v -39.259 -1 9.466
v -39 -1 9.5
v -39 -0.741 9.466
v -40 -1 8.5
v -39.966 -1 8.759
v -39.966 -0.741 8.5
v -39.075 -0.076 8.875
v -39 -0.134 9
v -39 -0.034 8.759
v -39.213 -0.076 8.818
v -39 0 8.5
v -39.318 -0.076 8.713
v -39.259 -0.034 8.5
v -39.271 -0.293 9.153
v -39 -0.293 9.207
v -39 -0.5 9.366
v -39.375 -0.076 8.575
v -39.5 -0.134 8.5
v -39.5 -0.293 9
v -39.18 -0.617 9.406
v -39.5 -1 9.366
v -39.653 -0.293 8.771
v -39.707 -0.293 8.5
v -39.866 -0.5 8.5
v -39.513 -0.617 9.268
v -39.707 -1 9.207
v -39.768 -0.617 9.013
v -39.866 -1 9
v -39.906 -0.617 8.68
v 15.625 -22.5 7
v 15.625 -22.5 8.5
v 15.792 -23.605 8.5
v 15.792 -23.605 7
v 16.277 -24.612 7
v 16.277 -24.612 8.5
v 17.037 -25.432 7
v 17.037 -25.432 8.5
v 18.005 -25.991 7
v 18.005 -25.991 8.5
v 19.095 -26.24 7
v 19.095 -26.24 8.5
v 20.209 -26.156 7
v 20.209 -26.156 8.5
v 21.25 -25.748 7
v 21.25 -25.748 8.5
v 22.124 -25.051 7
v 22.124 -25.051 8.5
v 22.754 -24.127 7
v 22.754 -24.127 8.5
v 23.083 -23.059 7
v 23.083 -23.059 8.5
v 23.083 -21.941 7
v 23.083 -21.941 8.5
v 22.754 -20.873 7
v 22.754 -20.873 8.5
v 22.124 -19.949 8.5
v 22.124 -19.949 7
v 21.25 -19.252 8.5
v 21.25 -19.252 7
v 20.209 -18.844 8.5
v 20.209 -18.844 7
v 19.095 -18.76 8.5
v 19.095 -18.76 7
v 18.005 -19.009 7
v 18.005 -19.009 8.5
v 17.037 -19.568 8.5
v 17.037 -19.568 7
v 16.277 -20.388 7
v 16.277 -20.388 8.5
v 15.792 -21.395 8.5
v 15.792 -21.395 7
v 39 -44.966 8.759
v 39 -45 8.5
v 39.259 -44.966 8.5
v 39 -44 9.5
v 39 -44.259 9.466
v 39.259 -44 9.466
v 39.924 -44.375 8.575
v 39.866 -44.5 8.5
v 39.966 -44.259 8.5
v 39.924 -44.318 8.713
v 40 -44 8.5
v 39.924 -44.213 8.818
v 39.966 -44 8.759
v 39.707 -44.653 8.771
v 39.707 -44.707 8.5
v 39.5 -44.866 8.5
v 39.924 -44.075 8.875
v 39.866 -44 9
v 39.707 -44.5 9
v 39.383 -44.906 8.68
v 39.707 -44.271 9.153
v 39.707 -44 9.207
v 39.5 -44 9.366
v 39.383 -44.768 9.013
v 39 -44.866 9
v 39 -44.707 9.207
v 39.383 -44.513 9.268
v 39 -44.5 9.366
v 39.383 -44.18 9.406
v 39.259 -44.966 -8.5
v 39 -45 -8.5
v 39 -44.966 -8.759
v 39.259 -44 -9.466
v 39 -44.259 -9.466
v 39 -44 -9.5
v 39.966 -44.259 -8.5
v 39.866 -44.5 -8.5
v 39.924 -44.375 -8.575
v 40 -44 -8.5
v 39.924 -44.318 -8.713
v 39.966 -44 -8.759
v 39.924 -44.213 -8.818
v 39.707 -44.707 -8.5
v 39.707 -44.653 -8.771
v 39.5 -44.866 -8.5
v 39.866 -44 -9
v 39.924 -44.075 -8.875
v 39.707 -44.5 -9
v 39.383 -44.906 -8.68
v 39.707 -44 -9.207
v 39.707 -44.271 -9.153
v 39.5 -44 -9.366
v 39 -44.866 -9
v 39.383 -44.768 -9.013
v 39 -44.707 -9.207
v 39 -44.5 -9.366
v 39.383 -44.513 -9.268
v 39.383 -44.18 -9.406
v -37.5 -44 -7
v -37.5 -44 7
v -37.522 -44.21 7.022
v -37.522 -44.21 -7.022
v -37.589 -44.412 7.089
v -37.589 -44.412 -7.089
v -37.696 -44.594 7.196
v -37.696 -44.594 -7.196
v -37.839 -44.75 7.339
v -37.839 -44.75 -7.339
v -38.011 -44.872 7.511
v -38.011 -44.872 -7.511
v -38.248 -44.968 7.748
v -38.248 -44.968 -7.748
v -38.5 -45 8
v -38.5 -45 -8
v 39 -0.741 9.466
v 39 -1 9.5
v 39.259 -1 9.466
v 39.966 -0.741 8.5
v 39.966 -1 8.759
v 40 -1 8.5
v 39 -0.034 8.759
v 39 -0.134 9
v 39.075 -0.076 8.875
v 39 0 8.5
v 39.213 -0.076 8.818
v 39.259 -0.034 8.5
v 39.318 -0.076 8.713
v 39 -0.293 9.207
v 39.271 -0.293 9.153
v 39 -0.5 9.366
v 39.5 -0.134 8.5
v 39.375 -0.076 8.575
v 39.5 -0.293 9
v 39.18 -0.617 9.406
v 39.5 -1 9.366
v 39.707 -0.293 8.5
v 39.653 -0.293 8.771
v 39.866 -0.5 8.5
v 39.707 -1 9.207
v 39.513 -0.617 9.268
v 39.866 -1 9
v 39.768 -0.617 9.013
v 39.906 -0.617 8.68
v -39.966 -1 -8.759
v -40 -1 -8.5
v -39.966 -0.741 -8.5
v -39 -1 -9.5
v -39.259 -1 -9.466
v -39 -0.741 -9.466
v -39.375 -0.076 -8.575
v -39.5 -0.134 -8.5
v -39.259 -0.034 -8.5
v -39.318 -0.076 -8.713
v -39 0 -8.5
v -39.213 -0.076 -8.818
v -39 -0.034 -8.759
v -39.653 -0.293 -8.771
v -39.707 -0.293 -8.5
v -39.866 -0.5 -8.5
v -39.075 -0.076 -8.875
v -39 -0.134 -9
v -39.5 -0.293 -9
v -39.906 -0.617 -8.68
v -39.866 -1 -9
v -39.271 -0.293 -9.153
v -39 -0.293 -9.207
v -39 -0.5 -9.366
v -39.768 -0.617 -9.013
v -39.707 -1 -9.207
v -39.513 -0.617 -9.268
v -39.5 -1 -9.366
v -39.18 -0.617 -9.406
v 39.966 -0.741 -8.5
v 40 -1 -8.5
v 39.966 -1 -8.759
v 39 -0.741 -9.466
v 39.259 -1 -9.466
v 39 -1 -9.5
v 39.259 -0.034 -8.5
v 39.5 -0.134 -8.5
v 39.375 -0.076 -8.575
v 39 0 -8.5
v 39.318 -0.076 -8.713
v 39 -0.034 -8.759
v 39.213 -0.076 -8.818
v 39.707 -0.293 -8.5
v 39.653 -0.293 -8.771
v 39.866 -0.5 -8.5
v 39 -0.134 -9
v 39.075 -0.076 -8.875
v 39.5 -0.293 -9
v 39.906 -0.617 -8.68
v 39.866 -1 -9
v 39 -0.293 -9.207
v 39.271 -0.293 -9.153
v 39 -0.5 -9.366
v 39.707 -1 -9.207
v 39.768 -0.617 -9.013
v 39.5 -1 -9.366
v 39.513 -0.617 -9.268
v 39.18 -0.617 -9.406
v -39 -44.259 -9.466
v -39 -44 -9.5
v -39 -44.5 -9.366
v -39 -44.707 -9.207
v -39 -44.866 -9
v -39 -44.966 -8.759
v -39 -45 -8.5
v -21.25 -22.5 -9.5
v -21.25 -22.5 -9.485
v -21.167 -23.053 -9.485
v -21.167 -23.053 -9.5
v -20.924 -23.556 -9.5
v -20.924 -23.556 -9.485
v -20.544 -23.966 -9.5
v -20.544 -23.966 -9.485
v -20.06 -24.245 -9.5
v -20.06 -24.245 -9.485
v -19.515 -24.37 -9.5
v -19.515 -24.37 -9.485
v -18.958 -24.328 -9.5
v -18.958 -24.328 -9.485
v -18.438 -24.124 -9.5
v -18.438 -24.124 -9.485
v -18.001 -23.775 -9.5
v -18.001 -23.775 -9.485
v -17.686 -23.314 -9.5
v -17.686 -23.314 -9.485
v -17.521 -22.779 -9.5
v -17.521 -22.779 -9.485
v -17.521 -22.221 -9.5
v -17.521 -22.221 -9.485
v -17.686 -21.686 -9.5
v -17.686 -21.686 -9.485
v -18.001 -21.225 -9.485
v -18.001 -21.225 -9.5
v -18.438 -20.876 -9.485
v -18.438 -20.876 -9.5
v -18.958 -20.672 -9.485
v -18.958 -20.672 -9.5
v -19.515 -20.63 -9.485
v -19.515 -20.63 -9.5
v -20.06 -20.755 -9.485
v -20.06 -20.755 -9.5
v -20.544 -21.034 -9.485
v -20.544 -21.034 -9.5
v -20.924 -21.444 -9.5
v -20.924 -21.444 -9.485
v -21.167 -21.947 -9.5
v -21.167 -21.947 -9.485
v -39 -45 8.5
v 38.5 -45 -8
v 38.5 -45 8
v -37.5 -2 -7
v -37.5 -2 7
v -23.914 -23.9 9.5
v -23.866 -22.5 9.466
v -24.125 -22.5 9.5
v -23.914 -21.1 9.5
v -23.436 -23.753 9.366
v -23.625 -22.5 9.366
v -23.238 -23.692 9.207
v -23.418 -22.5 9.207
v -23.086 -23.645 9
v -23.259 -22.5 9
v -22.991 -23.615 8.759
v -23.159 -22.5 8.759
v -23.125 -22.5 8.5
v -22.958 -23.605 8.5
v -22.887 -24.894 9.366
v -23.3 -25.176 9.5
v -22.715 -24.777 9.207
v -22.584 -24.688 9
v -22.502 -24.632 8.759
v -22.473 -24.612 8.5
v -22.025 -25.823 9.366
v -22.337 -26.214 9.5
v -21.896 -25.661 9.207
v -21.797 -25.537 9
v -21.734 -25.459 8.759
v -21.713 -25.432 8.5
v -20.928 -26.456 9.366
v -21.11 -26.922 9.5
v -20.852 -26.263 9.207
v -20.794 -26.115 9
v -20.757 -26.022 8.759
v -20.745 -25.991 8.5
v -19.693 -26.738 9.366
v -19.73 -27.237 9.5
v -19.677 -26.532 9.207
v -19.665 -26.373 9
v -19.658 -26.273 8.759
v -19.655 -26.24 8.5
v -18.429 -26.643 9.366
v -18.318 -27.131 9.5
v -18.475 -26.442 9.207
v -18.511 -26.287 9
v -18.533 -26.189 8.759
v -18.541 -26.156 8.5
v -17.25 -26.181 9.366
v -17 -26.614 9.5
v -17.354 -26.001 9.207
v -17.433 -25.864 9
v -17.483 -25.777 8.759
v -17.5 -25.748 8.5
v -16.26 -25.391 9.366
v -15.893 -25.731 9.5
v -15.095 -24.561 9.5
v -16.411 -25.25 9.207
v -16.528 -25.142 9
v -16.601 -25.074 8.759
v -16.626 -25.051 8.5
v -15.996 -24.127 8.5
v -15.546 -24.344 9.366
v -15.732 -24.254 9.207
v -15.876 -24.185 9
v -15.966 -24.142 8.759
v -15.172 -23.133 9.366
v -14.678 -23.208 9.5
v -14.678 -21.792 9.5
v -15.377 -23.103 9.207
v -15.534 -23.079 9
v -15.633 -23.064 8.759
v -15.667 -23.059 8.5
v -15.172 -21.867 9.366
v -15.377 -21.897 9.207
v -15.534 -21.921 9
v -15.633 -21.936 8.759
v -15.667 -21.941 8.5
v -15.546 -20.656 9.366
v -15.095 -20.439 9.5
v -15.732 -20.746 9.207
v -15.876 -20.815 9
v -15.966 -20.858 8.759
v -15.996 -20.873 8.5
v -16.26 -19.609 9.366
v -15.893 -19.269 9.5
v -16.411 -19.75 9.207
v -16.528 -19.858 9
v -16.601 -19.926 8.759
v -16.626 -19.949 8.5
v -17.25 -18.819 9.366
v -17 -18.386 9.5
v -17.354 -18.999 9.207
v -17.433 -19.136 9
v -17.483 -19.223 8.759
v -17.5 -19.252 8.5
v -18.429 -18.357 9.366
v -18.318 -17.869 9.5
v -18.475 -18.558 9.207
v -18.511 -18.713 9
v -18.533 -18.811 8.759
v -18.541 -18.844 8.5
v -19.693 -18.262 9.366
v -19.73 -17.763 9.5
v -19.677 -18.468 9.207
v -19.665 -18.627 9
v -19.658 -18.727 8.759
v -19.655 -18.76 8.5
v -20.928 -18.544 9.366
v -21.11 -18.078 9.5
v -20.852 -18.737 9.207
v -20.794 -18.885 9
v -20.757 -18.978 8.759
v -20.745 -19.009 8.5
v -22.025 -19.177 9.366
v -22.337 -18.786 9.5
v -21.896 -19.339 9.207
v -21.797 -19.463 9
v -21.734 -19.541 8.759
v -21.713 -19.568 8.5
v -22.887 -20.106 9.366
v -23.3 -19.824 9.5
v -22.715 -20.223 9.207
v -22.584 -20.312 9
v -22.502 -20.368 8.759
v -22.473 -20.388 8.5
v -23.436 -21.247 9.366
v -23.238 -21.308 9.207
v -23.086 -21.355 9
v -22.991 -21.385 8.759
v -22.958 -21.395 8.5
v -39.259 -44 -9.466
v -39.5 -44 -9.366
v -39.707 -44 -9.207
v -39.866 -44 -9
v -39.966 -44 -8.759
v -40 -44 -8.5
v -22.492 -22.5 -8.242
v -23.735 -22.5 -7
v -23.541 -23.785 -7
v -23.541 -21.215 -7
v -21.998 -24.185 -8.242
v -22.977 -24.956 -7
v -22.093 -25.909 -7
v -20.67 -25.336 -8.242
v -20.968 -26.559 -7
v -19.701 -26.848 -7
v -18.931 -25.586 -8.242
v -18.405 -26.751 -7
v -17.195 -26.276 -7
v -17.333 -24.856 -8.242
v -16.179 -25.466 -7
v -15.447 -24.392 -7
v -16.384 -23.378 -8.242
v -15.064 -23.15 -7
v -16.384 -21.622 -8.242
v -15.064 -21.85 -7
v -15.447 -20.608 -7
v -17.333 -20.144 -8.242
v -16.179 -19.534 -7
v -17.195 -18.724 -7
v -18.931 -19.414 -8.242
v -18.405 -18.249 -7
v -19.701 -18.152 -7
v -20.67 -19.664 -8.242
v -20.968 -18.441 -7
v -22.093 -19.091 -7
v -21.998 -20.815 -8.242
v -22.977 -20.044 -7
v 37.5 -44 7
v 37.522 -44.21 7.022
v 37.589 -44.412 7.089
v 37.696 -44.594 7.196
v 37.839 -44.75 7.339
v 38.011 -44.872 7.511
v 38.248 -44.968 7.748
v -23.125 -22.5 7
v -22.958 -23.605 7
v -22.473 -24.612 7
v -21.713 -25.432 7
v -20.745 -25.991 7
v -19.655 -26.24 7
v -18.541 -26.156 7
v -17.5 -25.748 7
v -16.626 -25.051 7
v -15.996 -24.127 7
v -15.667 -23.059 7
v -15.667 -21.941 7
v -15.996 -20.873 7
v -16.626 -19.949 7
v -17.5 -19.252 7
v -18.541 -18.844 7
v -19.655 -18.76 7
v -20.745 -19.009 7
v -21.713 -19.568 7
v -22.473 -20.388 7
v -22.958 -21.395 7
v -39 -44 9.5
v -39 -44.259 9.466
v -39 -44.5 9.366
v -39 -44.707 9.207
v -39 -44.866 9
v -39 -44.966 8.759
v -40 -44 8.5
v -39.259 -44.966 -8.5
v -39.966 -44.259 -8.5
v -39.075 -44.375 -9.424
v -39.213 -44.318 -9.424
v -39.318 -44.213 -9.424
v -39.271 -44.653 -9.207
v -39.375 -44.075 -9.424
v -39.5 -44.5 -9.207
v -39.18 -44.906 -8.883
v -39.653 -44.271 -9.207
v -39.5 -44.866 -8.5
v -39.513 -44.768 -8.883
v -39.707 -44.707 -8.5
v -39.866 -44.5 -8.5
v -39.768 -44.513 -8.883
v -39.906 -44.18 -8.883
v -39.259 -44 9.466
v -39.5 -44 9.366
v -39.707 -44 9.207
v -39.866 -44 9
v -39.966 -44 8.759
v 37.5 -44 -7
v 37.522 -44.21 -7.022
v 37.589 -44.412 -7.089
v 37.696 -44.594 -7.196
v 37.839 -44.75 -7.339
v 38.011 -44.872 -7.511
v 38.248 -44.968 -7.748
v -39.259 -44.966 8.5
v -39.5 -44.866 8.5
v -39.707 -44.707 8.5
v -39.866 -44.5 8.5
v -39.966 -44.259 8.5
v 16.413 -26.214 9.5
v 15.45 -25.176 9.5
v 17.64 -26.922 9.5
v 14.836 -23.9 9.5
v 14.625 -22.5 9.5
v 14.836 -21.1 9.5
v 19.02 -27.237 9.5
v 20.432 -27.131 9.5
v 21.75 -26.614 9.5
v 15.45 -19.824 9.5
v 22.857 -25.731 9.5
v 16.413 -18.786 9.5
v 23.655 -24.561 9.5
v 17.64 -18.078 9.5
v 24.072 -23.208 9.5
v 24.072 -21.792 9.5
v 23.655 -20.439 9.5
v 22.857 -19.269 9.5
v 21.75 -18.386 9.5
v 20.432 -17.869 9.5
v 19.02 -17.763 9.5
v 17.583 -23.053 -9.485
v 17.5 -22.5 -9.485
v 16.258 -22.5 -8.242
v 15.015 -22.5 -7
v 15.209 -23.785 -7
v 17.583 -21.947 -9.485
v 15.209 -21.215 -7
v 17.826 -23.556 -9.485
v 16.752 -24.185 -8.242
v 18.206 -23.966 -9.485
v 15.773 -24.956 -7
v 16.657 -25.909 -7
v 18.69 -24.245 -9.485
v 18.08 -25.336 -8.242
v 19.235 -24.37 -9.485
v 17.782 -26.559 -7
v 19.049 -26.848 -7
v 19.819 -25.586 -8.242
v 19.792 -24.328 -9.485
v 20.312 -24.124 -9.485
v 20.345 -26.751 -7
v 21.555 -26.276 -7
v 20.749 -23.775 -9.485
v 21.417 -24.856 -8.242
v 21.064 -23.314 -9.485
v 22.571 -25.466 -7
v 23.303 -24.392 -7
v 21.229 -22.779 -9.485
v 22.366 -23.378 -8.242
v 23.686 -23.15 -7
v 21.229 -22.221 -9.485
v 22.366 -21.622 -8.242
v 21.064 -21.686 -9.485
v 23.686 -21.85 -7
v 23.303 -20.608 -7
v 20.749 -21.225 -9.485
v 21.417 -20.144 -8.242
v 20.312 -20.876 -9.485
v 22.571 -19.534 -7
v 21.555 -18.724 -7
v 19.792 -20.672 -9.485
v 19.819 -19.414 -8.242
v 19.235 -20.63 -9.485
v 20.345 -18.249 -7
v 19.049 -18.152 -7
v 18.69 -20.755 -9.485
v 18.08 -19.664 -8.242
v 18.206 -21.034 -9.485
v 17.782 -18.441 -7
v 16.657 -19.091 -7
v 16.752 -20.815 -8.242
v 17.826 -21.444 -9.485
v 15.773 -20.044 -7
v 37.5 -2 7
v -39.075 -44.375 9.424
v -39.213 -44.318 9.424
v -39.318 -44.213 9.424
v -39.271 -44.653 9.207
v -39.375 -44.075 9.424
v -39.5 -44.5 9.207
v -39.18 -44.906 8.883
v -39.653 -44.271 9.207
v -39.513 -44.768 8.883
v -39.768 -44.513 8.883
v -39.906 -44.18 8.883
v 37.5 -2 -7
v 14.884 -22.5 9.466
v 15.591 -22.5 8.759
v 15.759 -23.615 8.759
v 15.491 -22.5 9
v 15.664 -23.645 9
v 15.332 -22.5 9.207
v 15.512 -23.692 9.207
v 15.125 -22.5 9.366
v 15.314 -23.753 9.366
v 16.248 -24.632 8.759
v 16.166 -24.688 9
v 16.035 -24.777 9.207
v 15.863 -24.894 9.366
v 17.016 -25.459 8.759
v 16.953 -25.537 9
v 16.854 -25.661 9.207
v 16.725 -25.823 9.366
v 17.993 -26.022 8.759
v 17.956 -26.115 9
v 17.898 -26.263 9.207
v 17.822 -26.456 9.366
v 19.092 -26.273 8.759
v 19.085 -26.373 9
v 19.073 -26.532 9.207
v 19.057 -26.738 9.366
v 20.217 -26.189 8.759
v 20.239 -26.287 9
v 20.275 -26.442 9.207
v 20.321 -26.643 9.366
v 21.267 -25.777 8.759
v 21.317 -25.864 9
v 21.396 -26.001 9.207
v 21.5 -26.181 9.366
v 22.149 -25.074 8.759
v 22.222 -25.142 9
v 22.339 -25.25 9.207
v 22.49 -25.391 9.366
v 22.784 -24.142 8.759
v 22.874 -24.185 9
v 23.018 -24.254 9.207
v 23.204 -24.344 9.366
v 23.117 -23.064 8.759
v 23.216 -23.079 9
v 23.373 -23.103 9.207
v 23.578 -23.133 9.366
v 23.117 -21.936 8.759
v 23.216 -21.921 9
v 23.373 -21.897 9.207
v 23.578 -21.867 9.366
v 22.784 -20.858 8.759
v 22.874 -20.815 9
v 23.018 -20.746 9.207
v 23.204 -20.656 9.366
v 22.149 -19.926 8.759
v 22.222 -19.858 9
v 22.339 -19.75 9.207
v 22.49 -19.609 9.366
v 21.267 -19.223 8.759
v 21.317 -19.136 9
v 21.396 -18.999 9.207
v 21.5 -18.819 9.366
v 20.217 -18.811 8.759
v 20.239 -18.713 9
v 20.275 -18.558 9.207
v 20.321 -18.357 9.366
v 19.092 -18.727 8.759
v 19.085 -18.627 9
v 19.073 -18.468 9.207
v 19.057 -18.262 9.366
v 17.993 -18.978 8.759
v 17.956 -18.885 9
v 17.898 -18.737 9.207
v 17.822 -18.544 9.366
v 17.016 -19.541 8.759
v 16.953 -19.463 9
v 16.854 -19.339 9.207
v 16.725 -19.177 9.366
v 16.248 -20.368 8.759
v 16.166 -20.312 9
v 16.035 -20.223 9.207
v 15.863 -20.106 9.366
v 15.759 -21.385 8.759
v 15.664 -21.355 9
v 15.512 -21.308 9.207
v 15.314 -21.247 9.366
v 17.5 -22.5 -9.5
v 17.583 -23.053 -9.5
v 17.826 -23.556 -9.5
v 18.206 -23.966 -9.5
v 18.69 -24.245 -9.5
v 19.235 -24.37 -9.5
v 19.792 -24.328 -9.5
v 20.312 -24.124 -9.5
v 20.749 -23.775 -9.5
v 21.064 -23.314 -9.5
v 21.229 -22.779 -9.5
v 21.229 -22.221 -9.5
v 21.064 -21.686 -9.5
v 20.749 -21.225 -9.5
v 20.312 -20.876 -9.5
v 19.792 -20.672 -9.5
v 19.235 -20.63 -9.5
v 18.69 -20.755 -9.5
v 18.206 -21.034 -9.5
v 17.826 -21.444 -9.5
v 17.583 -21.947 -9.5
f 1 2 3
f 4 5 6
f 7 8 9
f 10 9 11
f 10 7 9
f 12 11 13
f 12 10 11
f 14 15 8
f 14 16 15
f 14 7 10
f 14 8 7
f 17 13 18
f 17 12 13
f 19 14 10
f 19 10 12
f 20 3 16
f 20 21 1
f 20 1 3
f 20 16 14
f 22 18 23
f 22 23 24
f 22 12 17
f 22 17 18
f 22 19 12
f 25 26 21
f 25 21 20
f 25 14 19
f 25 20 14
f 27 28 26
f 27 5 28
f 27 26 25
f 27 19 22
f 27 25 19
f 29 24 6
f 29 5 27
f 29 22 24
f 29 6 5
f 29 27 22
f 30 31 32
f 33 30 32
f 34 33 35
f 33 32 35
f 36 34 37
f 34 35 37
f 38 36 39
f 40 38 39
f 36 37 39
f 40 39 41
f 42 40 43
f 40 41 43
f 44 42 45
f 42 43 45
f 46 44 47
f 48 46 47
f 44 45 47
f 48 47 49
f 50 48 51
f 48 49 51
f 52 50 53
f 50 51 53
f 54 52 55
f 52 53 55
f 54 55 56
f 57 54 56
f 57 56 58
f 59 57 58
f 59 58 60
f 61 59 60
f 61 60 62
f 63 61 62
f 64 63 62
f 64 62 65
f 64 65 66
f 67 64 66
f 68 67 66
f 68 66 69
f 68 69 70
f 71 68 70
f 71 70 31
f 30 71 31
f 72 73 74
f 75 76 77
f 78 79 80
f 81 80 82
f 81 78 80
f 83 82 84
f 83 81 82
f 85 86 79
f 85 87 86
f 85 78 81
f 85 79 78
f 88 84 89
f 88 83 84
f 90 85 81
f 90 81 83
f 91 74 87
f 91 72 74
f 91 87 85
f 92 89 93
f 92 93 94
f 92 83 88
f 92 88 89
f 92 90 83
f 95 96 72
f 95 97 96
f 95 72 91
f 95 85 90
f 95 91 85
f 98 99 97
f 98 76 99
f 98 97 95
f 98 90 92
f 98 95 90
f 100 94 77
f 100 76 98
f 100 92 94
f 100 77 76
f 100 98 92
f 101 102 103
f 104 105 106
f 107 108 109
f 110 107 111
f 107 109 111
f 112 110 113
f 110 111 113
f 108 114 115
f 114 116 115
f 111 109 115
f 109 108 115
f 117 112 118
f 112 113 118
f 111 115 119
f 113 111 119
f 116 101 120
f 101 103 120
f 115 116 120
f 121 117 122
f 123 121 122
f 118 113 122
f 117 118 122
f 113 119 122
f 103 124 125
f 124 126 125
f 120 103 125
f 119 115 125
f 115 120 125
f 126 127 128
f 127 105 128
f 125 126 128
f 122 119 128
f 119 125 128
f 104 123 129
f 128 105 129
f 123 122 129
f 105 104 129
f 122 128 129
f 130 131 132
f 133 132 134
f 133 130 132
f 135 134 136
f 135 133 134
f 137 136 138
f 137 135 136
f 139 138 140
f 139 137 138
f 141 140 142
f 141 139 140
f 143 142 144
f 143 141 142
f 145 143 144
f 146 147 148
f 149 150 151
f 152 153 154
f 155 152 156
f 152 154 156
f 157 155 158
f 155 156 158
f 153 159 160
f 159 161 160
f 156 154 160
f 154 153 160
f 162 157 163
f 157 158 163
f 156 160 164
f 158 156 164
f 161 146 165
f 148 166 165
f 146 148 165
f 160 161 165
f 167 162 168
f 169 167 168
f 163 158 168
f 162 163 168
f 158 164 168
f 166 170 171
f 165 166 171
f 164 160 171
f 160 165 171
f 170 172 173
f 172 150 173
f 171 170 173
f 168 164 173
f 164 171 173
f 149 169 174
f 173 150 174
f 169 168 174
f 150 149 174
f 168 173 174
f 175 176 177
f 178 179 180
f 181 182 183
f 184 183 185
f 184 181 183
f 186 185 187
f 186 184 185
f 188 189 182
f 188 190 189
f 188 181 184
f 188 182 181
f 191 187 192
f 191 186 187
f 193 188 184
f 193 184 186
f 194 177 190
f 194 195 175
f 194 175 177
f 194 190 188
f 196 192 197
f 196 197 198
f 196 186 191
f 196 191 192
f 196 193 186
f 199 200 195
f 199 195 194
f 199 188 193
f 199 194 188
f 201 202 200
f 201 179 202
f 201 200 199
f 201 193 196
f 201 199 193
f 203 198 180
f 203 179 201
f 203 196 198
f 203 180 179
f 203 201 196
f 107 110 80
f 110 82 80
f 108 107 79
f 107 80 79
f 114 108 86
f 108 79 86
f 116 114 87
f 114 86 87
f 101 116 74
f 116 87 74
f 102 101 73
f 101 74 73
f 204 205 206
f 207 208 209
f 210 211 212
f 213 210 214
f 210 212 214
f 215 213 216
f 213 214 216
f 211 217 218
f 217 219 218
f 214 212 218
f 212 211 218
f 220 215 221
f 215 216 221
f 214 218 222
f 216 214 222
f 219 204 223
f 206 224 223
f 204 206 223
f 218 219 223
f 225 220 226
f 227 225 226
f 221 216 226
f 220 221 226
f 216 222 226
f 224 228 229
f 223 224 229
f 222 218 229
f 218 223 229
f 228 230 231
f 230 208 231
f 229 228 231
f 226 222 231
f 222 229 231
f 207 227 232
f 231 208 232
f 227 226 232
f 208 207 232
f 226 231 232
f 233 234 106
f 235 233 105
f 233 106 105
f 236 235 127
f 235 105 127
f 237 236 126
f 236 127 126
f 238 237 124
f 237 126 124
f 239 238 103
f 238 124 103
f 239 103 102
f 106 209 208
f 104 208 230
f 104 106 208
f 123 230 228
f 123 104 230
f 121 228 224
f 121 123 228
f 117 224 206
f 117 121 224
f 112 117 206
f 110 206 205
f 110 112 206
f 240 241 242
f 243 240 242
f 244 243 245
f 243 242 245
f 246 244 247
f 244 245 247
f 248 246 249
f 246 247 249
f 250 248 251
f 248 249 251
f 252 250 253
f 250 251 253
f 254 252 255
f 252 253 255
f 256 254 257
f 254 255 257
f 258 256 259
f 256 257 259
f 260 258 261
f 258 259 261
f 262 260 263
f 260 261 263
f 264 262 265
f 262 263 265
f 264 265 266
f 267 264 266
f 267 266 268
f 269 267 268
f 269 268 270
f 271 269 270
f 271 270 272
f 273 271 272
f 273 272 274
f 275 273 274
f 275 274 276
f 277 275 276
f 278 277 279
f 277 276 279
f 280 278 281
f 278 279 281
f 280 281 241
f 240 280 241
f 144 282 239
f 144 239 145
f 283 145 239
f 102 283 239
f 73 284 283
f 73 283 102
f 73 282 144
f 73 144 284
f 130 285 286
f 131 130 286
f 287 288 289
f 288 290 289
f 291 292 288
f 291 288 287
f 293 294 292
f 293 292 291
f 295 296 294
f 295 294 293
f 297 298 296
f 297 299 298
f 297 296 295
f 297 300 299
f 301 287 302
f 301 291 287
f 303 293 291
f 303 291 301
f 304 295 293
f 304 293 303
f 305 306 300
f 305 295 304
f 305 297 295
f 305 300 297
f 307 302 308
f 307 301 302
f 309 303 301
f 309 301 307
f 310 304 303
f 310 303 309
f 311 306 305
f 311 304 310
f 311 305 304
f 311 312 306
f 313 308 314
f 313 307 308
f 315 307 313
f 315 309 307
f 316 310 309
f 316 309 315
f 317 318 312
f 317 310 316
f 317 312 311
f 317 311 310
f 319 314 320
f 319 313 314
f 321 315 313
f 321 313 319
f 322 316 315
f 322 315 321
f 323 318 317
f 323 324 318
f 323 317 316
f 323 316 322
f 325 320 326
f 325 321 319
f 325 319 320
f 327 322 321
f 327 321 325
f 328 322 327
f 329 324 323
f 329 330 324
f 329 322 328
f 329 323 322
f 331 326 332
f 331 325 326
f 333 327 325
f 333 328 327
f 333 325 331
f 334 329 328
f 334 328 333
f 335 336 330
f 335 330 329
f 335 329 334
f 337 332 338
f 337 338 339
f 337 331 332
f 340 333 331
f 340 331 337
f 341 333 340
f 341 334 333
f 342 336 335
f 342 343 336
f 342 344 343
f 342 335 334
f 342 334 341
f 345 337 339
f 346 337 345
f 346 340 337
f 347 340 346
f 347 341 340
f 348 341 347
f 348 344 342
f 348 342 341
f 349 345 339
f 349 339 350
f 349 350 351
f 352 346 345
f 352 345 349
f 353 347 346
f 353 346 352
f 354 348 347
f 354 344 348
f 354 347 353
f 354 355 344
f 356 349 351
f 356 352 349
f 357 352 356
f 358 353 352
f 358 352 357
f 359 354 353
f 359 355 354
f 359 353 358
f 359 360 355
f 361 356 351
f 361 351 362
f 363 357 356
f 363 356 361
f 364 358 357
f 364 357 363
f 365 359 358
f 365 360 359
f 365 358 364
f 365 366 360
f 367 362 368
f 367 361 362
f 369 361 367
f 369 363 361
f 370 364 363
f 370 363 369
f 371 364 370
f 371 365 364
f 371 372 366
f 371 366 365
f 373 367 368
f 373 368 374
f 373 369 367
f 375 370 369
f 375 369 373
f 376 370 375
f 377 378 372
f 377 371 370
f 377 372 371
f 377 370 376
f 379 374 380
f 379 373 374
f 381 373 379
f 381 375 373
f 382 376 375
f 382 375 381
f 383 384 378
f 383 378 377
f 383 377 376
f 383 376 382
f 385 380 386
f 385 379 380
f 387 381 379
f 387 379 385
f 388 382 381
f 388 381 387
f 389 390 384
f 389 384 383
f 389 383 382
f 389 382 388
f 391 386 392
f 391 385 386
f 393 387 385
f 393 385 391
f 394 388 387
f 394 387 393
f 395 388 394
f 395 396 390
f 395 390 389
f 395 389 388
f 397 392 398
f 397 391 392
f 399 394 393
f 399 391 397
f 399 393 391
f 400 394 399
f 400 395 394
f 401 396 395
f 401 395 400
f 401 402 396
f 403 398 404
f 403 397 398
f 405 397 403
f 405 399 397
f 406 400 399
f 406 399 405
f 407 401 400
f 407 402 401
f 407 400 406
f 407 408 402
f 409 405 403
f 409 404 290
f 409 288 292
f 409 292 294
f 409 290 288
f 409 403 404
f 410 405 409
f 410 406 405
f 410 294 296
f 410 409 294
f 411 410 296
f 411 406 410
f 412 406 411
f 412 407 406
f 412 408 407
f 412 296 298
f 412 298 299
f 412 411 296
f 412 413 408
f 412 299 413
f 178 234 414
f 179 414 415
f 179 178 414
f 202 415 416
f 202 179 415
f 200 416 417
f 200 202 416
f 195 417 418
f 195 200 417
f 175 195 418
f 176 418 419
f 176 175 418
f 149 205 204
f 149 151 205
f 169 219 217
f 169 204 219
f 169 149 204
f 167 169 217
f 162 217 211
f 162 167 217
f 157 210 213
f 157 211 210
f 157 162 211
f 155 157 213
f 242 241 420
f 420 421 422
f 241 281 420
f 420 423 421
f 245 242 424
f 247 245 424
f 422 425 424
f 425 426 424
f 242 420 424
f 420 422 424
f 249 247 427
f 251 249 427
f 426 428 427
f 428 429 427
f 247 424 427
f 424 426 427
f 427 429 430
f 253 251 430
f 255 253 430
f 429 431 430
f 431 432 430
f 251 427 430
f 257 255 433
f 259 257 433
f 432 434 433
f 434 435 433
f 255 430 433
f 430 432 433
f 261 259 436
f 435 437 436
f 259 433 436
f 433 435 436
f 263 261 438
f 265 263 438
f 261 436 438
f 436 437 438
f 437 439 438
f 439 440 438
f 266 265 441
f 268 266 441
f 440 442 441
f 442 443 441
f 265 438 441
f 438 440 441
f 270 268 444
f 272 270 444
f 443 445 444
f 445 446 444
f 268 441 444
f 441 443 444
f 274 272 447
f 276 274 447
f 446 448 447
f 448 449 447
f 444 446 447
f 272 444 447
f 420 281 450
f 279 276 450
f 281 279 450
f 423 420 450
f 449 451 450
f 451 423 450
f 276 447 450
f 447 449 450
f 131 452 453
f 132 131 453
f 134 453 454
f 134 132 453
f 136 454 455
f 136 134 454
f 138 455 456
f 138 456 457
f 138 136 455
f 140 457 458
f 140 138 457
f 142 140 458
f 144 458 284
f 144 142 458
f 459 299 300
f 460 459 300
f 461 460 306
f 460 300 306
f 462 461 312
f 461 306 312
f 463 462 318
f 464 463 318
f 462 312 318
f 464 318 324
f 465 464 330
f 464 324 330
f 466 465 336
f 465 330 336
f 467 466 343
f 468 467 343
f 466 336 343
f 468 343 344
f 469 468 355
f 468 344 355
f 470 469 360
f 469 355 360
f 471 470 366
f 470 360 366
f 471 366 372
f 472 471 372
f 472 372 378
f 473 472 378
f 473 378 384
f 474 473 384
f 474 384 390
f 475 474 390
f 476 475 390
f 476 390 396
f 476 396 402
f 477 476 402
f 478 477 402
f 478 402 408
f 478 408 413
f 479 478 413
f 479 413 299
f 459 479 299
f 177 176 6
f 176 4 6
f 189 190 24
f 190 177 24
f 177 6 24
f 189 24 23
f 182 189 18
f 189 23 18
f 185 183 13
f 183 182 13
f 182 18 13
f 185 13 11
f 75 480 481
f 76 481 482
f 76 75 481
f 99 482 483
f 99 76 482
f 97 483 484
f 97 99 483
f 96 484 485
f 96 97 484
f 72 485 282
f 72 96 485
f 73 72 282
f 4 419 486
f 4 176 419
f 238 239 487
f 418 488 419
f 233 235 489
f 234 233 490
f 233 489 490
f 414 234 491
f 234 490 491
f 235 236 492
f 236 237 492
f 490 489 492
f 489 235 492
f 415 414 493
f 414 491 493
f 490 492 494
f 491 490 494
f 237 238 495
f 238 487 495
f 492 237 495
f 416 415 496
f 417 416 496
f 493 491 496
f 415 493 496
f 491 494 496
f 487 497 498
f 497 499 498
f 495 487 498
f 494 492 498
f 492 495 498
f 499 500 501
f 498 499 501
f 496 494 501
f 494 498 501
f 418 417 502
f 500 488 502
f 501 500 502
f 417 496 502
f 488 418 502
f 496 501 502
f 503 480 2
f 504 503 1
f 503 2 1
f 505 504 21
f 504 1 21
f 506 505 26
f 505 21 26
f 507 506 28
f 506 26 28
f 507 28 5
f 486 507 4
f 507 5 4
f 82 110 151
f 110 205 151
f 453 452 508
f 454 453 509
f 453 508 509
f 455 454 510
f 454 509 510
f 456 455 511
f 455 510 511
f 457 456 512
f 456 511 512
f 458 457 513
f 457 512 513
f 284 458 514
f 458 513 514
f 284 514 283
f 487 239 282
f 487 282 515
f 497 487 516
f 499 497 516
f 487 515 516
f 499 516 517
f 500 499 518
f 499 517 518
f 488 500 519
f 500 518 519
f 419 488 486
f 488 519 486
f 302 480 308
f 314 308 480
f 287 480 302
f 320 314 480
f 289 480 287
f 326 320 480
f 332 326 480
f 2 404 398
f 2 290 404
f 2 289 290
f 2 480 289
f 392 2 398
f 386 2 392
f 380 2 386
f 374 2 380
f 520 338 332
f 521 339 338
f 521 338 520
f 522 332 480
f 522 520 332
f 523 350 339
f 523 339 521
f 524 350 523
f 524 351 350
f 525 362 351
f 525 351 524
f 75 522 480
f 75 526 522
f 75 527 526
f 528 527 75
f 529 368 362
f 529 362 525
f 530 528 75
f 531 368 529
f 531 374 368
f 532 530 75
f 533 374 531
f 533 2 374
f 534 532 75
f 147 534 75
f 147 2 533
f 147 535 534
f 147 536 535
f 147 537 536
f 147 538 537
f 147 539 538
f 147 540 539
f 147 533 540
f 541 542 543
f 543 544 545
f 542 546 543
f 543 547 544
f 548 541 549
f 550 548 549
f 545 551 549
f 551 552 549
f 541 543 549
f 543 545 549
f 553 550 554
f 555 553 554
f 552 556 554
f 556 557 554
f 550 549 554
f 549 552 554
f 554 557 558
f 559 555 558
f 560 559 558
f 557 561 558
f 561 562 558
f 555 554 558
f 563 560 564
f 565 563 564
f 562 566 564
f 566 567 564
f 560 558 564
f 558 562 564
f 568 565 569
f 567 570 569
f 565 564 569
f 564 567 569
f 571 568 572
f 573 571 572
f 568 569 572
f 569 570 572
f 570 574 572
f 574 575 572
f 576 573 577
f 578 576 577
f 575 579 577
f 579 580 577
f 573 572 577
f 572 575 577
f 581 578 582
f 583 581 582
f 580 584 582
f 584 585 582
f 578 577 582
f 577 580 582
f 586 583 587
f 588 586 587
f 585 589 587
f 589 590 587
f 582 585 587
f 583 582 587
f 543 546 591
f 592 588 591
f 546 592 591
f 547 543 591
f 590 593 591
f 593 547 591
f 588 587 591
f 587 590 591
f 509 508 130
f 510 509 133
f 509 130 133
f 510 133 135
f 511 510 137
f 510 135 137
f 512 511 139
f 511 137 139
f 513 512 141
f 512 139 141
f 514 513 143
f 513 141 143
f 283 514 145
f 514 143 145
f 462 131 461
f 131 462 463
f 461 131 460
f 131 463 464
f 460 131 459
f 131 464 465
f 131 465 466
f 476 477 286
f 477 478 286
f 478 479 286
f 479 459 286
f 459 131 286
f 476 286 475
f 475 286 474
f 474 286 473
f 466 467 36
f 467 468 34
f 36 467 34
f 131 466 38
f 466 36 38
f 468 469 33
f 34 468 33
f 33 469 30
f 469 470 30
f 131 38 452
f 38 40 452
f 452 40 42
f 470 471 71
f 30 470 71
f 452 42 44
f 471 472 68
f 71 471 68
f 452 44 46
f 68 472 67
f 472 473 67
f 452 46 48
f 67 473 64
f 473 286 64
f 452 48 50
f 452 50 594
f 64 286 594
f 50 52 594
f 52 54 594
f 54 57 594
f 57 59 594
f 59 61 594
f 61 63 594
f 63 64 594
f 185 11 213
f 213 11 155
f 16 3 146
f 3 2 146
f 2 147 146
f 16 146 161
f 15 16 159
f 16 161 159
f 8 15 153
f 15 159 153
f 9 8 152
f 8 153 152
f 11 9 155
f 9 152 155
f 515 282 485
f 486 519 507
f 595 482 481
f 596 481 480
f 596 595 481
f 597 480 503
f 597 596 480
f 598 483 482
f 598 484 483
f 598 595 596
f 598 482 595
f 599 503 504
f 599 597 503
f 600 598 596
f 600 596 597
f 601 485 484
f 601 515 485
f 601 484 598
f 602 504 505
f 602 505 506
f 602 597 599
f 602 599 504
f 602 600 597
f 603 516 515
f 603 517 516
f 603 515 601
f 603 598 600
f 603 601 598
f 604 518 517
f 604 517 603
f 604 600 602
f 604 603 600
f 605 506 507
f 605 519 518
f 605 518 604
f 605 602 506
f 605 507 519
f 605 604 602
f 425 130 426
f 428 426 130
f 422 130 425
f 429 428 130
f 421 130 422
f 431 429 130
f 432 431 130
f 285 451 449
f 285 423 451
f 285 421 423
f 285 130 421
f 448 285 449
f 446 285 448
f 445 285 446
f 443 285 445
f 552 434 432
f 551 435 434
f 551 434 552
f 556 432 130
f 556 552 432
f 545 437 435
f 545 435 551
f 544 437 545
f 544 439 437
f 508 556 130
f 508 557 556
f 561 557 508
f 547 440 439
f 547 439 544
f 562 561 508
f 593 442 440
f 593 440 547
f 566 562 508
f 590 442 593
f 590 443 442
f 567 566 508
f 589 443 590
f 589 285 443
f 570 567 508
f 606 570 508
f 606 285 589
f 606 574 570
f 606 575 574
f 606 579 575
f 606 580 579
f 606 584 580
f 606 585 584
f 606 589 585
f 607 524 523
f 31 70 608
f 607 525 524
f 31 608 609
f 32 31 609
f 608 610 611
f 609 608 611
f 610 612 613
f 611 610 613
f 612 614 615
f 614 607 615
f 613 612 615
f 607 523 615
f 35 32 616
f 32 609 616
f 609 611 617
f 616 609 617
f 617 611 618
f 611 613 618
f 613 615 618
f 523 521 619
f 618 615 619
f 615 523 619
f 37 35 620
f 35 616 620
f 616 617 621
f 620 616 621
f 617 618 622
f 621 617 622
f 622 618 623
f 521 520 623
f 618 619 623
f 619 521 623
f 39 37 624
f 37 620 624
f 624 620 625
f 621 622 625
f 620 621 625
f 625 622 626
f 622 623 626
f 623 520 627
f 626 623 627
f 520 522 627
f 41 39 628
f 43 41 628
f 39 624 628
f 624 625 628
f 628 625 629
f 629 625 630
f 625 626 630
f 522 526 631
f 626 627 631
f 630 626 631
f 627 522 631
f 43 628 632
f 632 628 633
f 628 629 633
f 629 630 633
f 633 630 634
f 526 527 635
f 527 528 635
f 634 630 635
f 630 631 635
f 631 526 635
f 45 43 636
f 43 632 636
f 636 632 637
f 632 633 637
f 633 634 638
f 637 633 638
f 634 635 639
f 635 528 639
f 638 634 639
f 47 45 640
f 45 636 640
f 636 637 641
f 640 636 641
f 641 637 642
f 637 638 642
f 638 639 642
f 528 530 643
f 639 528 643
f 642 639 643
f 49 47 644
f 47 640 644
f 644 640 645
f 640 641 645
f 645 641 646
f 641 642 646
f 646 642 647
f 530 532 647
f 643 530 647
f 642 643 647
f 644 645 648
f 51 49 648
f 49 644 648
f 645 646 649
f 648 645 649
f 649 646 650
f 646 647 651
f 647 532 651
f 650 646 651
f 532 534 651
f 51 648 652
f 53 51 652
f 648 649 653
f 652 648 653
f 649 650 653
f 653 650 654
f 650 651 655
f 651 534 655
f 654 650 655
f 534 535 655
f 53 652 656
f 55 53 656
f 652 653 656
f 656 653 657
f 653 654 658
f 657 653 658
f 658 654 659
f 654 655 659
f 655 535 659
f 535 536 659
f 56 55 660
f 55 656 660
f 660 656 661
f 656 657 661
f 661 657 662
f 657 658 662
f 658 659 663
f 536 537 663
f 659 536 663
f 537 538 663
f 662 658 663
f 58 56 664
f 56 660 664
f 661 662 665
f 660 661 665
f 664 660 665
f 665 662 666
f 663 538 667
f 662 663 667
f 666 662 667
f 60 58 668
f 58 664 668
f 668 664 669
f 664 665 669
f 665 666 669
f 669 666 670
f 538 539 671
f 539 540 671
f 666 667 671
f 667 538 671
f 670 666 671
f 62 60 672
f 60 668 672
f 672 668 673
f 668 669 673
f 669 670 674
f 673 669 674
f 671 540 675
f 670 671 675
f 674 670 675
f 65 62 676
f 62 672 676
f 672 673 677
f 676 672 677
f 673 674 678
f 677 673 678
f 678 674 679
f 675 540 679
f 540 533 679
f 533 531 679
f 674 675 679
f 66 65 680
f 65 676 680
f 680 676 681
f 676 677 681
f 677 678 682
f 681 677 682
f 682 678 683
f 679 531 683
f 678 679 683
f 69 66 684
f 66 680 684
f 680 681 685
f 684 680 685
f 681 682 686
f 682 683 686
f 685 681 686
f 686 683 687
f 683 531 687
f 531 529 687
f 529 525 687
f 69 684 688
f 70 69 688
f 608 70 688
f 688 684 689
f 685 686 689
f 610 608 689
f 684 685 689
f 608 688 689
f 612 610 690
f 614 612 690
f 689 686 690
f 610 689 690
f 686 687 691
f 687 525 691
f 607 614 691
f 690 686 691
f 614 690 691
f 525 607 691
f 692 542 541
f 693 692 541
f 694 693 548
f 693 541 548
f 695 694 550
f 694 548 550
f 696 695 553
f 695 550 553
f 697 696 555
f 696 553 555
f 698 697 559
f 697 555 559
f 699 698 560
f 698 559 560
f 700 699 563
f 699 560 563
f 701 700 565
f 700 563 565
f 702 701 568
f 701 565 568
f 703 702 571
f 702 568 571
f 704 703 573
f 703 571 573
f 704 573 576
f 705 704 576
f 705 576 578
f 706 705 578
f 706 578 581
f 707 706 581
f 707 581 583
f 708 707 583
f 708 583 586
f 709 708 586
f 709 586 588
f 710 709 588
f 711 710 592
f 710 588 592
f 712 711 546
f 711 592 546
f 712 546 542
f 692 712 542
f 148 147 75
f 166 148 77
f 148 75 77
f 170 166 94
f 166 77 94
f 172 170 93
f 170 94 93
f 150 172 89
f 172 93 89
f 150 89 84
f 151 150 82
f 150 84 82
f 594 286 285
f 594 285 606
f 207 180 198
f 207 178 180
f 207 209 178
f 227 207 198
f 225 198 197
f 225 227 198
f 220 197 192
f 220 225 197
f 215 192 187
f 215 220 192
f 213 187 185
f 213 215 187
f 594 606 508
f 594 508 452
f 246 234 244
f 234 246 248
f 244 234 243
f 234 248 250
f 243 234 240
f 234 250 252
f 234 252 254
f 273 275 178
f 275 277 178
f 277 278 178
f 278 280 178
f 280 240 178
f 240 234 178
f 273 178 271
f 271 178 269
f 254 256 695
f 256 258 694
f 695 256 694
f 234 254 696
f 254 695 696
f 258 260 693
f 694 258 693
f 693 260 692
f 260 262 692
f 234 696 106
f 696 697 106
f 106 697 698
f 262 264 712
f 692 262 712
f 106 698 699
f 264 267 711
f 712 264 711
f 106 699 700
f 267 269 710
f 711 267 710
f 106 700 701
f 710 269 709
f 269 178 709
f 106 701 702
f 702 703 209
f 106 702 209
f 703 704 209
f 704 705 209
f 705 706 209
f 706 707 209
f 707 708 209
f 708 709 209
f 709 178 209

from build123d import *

# Parameters (mm, degrees)
SKETCH_W          = 80
SKETCH_H          = 19
PAD_DEPTH         = 45
SKETCH001_W       = 75
SKETCH001_H       = 14
POCKET_DEPTH      = 0.001
POCKET_DEPTH_BACK = 45.001
SKETCH002_R       = 3.75
POCKET001_DEPTH   = 3.5
SKETCH003_R       = 1.875
POCKET002_DEPTH   = 2.5
CHAMFER_SIZE      = 2.485
SKETCH004_W       = 80
SKETCH004_H       = 19
PAD001_DEPTH      = 2
FILLET_R          = 1


with BuildPart() as part:
    # Sketch → Pad (new body)
    with BuildSketch(Plane.XZ):
        Rectangle(SKETCH_W, SKETCH_H)
    extrude(amount=PAD_DEPTH)

    # Sketch001 → Pocket (cut, two sides)
    with BuildSketch(Plane.XZ) as pocket_sk:
        Rectangle(SKETCH001_W, SKETCH001_H)
    extrude(amount=-POCKET_DEPTH, mode=Mode.SUBTRACT)
    extrude(pocket_sk.sketch, amount=POCKET_DEPTH_BACK, mode=Mode.SUBTRACT)

    # Sketch002 (on DatumPlane) → Pocket001 (cut)
    with BuildSketch(Plane(origin=(0, 0, 9.5), x_dir=(-1, 0, 0), z_dir=(0, 0, 1))):
        with Locations((-19.375, 22.5)):
            Circle(SKETCH002_R)
        with Locations((19.375, 22.5)):
            Circle(SKETCH002_R)
    extrude(amount=-POCKET001_DEPTH, mode=Mode.SUBTRACT)

    # Sketch003 (on DatumPlane) → Pocket002 (cut)
    with BuildSketch(Plane(origin=(0, 0, -7), x_dir=(-1, 0, 0), z_dir=(0, 0, 1))):
        with Locations((-19.375, 22.5)):
            Circle(SKETCH003_R)
        with Locations((19.375, 22.5)):
            Circle(SKETCH003_R)
    extrude(amount=-POCKET002_DEPTH, mode=Mode.SUBTRACT)

    # Chamfer
    chamfer_edges = [part.edges().sort_by_distance(p)[0] for p in [
        (-17.5, -22.5, -7),
        (21.25, -22.5, -7),
    ]]
    chamfer(chamfer_edges, length=CHAMFER_SIZE)

    # Sketch004 → Pad001 (join)
    with BuildSketch(Plane.XZ):
        Rectangle(SKETCH004_W, SKETCH004_H)
    extrude(amount=PAD001_DEPTH)

    # Fillet
    fillet_edges = [part.edges().sort_by_distance(p)[0] for p in [
        (-40, -45, 0),
        (0, -45, 9.5),
        (0, -45, -9.5),
        (40, -45, 0),
        (-37.5, -45, 0),
        (0, -45, 7),
        (37.5, -45, 0),
        (0, -45, -7),
        (40, -23.5, 9.5),
        (40, -23.5, -9.5),
        (-40, -23.5, 9.5),
        (-40, -23.5, -9.5),
        (0, 0, 9.5),
        (-40, 0, 0),
        (40, 0, 0),
        (40, -1, 9.5),
        (-40, -1, 9.5),
        (-40, -1, -9.5),
        (40, -1, -9.5),
        (0, 0, -9.5),
        (-15.625, -22.5, 9.5),
        (23.125, -22.5, 9.5),
    ]]
    fillet(fillet_edges, radius=FILLET_R)


solid = part.part
